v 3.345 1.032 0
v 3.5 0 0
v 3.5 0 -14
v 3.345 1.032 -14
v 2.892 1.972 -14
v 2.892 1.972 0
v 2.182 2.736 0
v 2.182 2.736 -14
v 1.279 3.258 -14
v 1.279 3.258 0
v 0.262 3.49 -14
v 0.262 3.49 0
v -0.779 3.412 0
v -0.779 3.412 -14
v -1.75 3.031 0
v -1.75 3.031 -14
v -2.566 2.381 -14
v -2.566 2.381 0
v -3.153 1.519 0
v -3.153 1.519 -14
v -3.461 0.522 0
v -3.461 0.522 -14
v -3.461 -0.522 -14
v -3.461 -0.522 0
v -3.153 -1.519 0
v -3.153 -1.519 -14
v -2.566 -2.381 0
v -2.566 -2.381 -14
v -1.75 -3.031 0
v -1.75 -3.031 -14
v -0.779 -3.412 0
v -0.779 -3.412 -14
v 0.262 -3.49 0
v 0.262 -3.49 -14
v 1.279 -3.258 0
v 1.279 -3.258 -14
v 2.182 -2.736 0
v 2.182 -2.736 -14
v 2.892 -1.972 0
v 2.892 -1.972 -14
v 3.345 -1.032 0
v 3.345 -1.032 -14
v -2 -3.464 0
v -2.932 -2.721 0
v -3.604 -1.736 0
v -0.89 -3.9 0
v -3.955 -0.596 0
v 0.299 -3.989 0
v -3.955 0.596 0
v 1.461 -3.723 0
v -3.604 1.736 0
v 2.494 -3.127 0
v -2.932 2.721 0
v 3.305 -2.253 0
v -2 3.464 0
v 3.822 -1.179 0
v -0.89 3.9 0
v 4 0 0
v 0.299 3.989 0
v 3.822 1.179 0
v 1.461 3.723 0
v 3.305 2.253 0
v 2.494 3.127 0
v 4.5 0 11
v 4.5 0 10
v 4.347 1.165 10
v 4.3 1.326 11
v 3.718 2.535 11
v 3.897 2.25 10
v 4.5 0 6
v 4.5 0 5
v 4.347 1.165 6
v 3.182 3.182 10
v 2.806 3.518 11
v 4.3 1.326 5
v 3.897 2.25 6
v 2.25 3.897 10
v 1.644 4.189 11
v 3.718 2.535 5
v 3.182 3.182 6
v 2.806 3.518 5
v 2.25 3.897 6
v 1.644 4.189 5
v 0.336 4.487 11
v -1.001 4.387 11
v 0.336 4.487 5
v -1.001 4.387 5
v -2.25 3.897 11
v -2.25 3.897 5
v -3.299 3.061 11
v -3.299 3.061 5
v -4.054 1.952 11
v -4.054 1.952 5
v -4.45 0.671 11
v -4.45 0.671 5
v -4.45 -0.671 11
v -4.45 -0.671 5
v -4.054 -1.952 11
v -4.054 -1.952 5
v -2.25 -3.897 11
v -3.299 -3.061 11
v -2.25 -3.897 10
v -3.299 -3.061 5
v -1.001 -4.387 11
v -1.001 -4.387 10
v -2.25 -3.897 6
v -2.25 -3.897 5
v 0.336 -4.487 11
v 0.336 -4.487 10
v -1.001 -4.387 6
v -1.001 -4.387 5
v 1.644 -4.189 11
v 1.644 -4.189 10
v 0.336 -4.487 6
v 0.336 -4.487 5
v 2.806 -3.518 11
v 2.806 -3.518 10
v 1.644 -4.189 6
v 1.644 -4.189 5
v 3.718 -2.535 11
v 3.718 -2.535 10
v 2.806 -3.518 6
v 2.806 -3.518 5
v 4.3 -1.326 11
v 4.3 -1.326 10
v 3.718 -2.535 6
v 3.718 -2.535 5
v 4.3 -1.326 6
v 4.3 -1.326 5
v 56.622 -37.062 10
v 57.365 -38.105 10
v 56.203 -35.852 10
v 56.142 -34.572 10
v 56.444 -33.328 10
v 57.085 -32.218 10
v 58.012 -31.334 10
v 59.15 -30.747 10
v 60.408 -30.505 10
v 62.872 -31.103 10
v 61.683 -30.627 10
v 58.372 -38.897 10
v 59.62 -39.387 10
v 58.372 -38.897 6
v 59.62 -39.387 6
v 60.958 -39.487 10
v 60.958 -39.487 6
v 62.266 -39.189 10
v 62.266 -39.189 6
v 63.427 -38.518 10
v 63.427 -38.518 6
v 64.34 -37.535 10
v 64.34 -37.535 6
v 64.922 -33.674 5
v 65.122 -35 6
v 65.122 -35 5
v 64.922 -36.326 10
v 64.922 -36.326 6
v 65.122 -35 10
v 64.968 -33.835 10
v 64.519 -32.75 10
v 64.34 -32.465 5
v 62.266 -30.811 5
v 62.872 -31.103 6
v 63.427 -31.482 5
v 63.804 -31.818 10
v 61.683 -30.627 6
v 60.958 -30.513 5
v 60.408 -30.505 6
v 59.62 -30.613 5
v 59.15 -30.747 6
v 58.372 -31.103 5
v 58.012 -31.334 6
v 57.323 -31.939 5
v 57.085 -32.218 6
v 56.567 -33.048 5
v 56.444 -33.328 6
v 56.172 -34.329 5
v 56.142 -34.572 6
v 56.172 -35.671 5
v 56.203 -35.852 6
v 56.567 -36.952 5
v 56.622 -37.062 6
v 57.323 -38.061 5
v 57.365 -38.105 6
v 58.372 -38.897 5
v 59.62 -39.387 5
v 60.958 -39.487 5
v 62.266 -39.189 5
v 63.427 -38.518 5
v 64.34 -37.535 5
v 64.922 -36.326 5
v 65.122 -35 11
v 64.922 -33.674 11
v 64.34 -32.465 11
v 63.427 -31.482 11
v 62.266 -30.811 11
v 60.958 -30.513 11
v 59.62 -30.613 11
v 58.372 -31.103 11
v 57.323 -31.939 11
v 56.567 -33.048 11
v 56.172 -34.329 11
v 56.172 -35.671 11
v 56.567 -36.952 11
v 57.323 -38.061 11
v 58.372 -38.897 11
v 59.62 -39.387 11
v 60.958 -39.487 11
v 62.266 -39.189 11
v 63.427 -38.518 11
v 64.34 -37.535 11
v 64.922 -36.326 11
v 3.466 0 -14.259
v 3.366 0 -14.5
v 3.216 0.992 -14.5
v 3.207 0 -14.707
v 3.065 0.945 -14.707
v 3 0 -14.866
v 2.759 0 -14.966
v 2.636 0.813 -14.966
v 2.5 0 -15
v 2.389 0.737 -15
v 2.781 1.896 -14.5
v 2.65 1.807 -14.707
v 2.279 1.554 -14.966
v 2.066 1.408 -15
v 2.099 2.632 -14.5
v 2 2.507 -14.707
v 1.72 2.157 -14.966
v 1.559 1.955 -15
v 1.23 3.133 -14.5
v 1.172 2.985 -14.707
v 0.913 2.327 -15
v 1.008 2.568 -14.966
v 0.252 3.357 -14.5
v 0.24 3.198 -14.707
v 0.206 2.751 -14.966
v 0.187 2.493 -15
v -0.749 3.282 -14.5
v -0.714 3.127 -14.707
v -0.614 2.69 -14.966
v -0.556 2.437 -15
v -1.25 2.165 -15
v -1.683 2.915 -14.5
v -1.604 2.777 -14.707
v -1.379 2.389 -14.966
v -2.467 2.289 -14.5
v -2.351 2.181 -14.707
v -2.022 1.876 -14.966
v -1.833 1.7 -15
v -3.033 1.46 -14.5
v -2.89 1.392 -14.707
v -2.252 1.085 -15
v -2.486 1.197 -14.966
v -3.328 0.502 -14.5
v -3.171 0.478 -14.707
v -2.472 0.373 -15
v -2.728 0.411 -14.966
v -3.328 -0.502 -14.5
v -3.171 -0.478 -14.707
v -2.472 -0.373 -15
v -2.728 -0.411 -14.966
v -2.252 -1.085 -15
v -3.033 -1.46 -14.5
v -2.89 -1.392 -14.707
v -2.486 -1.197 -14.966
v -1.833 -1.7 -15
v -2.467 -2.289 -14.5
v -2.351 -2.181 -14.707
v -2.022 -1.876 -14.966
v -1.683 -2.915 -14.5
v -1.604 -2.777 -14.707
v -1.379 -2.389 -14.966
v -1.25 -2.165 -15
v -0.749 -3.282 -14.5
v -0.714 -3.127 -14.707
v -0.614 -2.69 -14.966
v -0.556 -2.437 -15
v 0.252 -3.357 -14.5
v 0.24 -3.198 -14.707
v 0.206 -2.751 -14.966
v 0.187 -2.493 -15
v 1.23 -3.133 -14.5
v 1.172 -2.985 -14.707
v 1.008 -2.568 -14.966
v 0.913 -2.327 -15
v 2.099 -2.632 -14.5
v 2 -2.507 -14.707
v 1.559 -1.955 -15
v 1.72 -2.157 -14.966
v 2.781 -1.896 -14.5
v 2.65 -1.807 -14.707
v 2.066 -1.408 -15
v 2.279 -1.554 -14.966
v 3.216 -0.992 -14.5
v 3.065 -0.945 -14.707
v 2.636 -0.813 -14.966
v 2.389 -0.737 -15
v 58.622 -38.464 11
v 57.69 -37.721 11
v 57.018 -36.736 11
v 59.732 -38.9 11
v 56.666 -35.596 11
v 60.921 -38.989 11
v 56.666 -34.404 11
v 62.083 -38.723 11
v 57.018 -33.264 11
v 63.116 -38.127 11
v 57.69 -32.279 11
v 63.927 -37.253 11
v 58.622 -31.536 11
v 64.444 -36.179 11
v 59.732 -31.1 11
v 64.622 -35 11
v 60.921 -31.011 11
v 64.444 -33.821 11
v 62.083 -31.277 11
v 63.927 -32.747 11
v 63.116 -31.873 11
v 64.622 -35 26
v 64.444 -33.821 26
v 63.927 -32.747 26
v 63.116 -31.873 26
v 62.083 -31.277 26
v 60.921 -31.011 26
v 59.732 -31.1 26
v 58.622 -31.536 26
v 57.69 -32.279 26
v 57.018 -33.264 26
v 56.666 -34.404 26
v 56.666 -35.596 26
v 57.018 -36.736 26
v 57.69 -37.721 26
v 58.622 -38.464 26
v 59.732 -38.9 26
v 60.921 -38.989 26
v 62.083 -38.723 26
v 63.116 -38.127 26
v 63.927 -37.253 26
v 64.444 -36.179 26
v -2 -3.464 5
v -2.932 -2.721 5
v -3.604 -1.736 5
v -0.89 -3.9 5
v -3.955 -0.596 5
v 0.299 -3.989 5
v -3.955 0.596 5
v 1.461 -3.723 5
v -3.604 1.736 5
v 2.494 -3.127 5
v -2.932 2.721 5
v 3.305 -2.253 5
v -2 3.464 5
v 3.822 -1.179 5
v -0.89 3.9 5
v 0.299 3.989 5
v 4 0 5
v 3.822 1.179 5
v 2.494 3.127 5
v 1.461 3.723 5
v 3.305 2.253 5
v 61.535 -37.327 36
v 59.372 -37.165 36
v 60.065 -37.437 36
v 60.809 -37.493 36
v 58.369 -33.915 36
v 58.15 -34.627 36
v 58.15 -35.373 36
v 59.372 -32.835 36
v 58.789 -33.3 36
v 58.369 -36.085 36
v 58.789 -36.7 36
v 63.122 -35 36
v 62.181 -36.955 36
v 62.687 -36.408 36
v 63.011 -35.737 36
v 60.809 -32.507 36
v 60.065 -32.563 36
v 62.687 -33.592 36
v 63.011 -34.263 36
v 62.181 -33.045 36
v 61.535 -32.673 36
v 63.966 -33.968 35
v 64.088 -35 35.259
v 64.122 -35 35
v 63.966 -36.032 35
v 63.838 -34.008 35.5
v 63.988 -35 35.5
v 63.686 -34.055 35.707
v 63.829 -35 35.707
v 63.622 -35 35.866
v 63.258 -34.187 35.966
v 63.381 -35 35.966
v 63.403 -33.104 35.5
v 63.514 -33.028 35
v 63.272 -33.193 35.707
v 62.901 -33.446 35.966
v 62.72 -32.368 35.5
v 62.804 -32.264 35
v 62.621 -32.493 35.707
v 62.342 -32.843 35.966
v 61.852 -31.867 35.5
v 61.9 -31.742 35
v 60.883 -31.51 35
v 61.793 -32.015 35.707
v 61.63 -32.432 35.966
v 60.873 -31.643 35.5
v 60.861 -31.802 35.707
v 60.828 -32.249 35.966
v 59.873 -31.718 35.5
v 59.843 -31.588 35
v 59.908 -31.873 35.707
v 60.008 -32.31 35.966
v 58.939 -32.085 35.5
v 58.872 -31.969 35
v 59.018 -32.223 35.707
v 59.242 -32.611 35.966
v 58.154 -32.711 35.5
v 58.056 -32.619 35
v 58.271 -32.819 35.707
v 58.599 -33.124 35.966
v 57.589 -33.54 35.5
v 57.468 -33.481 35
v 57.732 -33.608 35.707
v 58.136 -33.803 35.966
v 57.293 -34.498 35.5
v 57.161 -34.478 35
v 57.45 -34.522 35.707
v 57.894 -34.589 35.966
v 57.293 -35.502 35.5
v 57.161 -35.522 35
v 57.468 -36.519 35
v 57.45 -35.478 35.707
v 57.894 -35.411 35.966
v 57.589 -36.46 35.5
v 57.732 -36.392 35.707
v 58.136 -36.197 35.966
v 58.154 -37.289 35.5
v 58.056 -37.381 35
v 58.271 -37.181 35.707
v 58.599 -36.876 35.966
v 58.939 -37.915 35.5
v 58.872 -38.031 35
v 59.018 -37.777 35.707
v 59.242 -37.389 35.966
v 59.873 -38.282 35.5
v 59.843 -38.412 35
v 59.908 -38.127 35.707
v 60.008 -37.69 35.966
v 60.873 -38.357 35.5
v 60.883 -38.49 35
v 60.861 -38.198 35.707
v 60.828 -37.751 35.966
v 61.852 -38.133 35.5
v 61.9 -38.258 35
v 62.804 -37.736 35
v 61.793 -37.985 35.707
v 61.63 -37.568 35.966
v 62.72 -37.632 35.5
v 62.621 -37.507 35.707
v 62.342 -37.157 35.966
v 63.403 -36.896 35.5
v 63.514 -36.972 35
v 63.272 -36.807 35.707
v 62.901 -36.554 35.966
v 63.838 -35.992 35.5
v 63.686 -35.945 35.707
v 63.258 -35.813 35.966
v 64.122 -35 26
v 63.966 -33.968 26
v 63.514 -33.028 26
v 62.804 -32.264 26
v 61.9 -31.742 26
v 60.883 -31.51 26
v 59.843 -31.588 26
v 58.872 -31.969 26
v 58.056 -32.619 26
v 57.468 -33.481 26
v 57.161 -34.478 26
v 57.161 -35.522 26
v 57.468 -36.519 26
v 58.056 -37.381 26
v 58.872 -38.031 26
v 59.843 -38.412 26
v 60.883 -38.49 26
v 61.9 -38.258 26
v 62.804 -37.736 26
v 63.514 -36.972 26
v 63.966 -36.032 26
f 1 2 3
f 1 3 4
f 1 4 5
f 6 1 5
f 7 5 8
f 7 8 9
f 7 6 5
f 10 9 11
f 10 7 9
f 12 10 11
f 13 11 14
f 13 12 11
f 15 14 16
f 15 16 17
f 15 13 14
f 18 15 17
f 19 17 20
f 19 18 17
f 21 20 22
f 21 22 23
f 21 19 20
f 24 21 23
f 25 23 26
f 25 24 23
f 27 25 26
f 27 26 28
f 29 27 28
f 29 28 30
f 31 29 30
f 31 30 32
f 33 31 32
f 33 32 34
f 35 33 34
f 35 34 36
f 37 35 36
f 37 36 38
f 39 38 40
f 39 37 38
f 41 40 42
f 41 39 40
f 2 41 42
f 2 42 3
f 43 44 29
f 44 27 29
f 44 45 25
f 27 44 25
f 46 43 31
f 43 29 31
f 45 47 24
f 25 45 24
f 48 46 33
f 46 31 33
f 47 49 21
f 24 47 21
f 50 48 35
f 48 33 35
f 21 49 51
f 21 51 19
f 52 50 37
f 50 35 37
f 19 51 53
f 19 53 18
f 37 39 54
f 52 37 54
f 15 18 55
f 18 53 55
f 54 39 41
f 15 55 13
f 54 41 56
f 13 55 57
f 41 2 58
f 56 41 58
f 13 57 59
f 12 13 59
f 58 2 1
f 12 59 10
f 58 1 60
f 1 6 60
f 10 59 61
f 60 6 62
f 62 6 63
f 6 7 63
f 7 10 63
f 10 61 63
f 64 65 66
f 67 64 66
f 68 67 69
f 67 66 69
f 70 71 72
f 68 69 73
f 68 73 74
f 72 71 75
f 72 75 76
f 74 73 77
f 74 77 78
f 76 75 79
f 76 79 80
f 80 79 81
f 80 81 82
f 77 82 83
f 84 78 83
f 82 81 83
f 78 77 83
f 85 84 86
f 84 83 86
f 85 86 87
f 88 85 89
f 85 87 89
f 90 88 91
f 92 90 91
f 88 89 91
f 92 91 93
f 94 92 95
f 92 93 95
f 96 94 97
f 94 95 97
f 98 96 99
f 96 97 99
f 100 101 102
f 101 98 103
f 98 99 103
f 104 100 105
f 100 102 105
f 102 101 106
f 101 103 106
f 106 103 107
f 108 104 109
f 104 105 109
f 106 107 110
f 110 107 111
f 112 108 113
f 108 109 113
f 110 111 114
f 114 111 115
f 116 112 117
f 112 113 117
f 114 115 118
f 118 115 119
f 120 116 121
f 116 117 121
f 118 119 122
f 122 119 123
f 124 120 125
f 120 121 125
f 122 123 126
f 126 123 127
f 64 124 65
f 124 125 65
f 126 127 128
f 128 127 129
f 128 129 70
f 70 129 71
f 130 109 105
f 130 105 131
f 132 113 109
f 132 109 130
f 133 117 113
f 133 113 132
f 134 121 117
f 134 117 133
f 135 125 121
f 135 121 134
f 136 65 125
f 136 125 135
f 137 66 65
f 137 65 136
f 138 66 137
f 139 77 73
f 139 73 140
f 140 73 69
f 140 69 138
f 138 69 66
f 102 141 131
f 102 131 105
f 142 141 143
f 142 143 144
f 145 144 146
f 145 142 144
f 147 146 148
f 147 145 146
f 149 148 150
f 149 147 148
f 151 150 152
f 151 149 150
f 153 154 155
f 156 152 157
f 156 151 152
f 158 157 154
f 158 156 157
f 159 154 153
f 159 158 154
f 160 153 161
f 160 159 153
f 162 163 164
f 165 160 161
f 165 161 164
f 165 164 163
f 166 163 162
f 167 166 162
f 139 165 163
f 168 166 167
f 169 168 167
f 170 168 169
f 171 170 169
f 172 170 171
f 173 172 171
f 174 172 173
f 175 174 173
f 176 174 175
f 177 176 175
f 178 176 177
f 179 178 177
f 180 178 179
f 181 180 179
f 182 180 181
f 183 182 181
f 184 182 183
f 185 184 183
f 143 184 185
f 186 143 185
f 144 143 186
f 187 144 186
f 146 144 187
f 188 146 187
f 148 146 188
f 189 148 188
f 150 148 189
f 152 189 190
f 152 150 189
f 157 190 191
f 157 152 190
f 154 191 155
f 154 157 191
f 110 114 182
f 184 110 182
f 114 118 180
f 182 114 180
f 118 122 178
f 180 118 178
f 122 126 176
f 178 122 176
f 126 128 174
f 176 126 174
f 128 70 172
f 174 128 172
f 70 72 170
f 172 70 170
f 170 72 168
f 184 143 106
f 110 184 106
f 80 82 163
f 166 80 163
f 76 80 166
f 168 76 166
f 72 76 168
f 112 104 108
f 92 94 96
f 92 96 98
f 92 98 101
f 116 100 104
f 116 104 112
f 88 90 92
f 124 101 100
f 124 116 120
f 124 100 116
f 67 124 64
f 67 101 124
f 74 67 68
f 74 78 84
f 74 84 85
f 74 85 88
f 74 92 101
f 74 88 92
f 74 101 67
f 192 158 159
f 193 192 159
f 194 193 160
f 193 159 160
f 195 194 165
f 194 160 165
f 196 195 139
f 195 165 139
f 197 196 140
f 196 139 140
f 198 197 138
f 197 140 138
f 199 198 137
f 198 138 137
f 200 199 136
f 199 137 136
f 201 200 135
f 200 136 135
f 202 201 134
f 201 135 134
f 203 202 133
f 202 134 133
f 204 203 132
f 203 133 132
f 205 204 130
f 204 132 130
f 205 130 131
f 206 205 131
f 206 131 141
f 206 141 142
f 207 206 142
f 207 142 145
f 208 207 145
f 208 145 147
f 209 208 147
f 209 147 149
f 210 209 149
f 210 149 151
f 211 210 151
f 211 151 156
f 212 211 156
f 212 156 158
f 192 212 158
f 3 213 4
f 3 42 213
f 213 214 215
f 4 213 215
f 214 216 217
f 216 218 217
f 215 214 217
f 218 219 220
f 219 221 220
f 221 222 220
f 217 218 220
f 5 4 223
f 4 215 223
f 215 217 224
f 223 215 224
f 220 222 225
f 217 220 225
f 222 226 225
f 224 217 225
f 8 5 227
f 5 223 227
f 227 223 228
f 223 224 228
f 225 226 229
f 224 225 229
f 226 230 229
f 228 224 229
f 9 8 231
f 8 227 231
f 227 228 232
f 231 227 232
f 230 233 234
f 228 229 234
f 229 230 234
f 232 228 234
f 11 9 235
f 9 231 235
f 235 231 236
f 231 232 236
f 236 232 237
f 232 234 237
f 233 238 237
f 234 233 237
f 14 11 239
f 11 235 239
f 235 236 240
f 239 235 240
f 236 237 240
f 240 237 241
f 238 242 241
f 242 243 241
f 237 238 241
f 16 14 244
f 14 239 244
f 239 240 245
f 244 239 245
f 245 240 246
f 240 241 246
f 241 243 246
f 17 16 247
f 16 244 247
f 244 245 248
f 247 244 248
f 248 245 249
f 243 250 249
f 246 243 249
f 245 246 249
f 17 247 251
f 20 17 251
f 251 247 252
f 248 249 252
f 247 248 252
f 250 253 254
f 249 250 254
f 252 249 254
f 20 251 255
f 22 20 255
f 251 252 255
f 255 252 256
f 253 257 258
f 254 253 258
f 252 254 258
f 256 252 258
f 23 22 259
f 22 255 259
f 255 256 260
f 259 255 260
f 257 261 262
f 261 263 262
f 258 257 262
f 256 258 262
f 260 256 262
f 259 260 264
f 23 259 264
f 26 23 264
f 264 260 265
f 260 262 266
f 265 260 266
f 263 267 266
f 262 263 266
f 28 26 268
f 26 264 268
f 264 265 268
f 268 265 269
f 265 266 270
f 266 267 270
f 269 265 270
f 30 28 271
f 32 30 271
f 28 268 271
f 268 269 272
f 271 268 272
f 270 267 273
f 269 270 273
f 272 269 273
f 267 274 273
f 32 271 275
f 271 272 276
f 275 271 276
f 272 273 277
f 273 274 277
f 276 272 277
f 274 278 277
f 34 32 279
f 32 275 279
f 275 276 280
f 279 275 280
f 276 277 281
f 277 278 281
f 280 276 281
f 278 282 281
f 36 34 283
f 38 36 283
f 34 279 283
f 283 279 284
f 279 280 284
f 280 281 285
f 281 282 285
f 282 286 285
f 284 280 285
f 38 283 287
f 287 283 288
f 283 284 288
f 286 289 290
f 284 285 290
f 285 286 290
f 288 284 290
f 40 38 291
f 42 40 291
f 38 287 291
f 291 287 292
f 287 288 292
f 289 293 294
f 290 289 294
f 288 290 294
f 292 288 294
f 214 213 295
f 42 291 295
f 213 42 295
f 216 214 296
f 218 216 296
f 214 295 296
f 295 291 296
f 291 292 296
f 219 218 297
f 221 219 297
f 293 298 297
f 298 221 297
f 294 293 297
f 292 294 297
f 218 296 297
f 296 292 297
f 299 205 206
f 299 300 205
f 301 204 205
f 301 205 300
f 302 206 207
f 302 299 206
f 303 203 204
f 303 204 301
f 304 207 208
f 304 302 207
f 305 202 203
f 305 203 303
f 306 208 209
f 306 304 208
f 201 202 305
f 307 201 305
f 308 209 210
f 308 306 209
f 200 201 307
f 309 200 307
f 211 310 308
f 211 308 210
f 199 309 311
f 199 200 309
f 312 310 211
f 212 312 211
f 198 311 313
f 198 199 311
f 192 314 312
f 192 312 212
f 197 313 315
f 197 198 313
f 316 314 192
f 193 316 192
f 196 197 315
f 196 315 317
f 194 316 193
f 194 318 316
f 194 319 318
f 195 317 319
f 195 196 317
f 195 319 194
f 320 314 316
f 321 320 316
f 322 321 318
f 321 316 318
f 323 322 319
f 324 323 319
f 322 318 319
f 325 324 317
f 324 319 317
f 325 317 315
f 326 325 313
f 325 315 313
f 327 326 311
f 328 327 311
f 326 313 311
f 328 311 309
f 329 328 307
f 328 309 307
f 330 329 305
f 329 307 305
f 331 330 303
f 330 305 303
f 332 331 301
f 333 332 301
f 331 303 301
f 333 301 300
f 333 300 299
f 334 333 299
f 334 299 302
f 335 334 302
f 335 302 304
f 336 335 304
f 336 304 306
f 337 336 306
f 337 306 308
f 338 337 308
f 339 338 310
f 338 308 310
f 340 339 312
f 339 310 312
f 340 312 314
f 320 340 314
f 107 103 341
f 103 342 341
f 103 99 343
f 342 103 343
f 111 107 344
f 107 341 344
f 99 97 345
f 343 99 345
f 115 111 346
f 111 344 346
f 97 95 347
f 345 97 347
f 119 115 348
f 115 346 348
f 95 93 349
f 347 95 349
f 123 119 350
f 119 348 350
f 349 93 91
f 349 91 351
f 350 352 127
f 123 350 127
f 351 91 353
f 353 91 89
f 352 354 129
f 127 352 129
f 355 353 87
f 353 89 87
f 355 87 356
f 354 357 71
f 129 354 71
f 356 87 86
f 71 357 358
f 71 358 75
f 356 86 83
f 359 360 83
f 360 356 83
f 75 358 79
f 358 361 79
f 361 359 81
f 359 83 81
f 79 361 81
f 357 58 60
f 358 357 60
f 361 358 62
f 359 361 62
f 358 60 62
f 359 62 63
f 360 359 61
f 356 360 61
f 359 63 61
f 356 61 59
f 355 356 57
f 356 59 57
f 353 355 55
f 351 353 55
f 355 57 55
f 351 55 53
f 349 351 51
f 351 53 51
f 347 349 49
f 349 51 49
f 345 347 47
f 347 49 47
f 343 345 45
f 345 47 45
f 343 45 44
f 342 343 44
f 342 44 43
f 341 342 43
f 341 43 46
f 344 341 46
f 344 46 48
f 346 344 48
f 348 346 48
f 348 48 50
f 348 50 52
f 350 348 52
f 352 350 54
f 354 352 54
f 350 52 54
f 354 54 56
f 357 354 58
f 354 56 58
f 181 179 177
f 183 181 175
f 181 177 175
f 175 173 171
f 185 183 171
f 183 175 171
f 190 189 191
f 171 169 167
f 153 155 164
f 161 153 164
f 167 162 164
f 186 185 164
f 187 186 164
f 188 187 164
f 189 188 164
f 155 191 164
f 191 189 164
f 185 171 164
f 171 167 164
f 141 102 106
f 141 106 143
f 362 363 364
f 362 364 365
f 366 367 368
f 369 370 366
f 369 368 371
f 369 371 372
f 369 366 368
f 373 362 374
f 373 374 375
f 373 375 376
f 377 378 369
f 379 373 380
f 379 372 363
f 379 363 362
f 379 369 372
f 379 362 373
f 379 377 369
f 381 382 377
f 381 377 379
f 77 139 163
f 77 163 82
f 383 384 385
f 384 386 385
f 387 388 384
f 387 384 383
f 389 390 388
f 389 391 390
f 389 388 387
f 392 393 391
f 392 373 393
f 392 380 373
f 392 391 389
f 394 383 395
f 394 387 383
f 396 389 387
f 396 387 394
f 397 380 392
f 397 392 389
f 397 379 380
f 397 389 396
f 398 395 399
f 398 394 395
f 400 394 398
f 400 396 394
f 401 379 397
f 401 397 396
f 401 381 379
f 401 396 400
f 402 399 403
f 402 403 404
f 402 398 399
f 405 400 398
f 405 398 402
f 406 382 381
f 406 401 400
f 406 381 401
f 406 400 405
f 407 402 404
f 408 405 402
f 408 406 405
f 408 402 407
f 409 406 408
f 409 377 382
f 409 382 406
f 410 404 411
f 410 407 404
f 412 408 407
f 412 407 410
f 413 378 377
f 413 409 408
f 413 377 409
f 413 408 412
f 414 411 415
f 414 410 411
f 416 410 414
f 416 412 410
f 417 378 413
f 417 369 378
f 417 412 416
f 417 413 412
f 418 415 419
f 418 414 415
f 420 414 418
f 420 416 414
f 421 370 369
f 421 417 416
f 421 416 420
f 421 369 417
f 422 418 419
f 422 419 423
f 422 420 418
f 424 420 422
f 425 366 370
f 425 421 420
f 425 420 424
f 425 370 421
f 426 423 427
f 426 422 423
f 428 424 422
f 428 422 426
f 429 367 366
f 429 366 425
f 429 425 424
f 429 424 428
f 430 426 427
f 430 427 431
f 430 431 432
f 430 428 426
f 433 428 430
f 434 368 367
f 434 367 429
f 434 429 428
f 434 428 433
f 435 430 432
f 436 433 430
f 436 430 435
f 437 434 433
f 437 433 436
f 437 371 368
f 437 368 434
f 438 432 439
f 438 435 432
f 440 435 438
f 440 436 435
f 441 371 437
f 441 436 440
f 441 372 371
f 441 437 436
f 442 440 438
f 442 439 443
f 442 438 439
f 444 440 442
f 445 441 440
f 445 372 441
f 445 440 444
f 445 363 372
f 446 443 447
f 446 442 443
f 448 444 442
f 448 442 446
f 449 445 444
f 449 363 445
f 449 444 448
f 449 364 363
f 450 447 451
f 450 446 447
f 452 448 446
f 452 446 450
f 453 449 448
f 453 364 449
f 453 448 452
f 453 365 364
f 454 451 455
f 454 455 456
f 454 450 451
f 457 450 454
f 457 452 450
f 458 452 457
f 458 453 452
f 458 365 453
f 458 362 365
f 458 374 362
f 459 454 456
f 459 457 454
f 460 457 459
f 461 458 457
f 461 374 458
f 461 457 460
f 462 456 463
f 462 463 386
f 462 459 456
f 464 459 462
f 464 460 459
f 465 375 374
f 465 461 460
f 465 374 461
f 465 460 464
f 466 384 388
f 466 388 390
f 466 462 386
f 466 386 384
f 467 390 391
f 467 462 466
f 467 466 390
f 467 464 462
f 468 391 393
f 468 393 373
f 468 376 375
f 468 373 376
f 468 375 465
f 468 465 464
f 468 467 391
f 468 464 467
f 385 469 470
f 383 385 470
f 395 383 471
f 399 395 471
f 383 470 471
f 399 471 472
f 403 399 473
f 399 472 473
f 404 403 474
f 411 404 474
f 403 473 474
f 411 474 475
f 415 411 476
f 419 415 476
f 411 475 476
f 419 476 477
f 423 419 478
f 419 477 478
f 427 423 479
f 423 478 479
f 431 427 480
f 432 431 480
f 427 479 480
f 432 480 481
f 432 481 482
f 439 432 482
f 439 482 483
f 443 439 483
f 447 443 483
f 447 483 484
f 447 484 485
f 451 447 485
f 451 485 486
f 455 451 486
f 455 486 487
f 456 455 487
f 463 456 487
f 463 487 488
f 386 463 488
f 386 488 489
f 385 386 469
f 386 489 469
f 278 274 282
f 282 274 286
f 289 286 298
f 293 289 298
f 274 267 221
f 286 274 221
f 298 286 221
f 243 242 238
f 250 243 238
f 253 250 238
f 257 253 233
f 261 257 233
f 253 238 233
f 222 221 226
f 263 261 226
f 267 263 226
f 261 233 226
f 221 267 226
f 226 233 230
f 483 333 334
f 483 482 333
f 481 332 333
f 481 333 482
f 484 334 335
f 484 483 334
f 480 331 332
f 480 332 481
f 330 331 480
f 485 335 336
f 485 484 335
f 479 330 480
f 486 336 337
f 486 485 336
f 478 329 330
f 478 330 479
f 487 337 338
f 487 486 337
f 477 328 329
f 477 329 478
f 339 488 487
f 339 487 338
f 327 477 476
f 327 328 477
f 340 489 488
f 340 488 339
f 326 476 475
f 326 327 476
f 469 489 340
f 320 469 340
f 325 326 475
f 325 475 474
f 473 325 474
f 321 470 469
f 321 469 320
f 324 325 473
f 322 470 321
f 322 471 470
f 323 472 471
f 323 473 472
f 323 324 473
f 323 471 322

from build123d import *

# Parameters (mm, degrees)
SKETCH1_R                = 3.5
BOSS_EXTRUDE1_DEPTH      = 15
SKETCH2_R                = 4
BOSS_EXTRUDE2_DEPTH      = 5
SKETCH3_R                = 4.5
BOSS_EXTRUDE3_DEPTH      = 5
BOSS_EXTRUDE4_DEPTH      = 4
SKETCH6_R                = 4.5
BOSS_EXTRUDE5_DEPTH      = 1
BOSS_EXTRUDE5_DEPTH_BACK = 5
SKETCH7_R                = 4
BOSS_EXTRUDE6_DEPTH      = 15
SKETCH8_R                = 3.5
BOSS_EXTRUDE7_DEPTH      = 10
FILLET3_R                = 1


with BuildPart() as part:
    # Sketch1 → Boss-Extrude1 (new body)
    with BuildSketch(Plane.XY):
        Circle(SKETCH1_R)
    extrude(amount=-BOSS_EXTRUDE1_DEPTH)

    # Sketch2 → Boss-Extrude2 (add)
    with BuildSketch(Plane.XY):
        Circle(SKETCH2_R)
    extrude(amount=BOSS_EXTRUDE2_DEPTH)

    # Sketch3 → Boss-Extrude3 (add)
    with BuildSketch(Plane.XY.offset(5)):
        Circle(SKETCH3_R)
    extrude(amount=BOSS_EXTRUDE3_DEPTH)

    # Sketch5 → Boss-Extrude4 (add)
    with BuildSketch(Plane.XY.offset(10)):
        with BuildLine():
            Line((0, 0), (-2.25, -3.897114317))
            Line((-2.25, -3.897114317), (58.371778036, -38.897114185))
            ThreePointArc((58.371778036, -38.897114185), (64.518892287, -37.249999982), (62.871778265, -31.102885683))
            Line((62.871778265, -31.102885683), (2.25, 3.897114317))
            Line((2.25, 3.897114317), (0, 0))
        make_face()
    extrude(amount=-BOSS_EXTRUDE4_DEPTH)

    # Sketch6 → Boss-Extrude5 (add, two sides)
    with BuildSketch(Plane.XY.offset(10)) as boss_extrude5_sk:
        Circle(SKETCH6_R)
        with Locations((60.621778036, -34.999999868)):
            Circle(SKETCH6_R)
    extrude(amount=BOSS_EXTRUDE5_DEPTH)
    extrude(boss_extrude5_sk.sketch, amount=-BOSS_EXTRUDE5_DEPTH_BACK)

    # Sketch7 → Boss-Extrude6 (add)
    with BuildSketch(Plane.XY.offset(11)):
        with Locations((60.621778036, -34.999999868)):
            Circle(SKETCH7_R)
    extrude(amount=BOSS_EXTRUDE6_DEPTH)

    # Sketch8 → Boss-Extrude7 (add)
    with BuildSketch(Plane.XY.offset(26)):
        with Locations((60.621778036, -34.999999868)):
            Circle(SKETCH8_R)
    extrude(amount=BOSS_EXTRUDE7_DEPTH)

    # Fillet3
    fillet3_edges = [part.edges().sort_by_distance(p)[0] for p in [
        (-3.5, 0, -15),
        (57.121778036, -34.999999868, 36),
    ]]
    fillet(fillet3_edges, radius=FILLET3_R)


solid = part.part
